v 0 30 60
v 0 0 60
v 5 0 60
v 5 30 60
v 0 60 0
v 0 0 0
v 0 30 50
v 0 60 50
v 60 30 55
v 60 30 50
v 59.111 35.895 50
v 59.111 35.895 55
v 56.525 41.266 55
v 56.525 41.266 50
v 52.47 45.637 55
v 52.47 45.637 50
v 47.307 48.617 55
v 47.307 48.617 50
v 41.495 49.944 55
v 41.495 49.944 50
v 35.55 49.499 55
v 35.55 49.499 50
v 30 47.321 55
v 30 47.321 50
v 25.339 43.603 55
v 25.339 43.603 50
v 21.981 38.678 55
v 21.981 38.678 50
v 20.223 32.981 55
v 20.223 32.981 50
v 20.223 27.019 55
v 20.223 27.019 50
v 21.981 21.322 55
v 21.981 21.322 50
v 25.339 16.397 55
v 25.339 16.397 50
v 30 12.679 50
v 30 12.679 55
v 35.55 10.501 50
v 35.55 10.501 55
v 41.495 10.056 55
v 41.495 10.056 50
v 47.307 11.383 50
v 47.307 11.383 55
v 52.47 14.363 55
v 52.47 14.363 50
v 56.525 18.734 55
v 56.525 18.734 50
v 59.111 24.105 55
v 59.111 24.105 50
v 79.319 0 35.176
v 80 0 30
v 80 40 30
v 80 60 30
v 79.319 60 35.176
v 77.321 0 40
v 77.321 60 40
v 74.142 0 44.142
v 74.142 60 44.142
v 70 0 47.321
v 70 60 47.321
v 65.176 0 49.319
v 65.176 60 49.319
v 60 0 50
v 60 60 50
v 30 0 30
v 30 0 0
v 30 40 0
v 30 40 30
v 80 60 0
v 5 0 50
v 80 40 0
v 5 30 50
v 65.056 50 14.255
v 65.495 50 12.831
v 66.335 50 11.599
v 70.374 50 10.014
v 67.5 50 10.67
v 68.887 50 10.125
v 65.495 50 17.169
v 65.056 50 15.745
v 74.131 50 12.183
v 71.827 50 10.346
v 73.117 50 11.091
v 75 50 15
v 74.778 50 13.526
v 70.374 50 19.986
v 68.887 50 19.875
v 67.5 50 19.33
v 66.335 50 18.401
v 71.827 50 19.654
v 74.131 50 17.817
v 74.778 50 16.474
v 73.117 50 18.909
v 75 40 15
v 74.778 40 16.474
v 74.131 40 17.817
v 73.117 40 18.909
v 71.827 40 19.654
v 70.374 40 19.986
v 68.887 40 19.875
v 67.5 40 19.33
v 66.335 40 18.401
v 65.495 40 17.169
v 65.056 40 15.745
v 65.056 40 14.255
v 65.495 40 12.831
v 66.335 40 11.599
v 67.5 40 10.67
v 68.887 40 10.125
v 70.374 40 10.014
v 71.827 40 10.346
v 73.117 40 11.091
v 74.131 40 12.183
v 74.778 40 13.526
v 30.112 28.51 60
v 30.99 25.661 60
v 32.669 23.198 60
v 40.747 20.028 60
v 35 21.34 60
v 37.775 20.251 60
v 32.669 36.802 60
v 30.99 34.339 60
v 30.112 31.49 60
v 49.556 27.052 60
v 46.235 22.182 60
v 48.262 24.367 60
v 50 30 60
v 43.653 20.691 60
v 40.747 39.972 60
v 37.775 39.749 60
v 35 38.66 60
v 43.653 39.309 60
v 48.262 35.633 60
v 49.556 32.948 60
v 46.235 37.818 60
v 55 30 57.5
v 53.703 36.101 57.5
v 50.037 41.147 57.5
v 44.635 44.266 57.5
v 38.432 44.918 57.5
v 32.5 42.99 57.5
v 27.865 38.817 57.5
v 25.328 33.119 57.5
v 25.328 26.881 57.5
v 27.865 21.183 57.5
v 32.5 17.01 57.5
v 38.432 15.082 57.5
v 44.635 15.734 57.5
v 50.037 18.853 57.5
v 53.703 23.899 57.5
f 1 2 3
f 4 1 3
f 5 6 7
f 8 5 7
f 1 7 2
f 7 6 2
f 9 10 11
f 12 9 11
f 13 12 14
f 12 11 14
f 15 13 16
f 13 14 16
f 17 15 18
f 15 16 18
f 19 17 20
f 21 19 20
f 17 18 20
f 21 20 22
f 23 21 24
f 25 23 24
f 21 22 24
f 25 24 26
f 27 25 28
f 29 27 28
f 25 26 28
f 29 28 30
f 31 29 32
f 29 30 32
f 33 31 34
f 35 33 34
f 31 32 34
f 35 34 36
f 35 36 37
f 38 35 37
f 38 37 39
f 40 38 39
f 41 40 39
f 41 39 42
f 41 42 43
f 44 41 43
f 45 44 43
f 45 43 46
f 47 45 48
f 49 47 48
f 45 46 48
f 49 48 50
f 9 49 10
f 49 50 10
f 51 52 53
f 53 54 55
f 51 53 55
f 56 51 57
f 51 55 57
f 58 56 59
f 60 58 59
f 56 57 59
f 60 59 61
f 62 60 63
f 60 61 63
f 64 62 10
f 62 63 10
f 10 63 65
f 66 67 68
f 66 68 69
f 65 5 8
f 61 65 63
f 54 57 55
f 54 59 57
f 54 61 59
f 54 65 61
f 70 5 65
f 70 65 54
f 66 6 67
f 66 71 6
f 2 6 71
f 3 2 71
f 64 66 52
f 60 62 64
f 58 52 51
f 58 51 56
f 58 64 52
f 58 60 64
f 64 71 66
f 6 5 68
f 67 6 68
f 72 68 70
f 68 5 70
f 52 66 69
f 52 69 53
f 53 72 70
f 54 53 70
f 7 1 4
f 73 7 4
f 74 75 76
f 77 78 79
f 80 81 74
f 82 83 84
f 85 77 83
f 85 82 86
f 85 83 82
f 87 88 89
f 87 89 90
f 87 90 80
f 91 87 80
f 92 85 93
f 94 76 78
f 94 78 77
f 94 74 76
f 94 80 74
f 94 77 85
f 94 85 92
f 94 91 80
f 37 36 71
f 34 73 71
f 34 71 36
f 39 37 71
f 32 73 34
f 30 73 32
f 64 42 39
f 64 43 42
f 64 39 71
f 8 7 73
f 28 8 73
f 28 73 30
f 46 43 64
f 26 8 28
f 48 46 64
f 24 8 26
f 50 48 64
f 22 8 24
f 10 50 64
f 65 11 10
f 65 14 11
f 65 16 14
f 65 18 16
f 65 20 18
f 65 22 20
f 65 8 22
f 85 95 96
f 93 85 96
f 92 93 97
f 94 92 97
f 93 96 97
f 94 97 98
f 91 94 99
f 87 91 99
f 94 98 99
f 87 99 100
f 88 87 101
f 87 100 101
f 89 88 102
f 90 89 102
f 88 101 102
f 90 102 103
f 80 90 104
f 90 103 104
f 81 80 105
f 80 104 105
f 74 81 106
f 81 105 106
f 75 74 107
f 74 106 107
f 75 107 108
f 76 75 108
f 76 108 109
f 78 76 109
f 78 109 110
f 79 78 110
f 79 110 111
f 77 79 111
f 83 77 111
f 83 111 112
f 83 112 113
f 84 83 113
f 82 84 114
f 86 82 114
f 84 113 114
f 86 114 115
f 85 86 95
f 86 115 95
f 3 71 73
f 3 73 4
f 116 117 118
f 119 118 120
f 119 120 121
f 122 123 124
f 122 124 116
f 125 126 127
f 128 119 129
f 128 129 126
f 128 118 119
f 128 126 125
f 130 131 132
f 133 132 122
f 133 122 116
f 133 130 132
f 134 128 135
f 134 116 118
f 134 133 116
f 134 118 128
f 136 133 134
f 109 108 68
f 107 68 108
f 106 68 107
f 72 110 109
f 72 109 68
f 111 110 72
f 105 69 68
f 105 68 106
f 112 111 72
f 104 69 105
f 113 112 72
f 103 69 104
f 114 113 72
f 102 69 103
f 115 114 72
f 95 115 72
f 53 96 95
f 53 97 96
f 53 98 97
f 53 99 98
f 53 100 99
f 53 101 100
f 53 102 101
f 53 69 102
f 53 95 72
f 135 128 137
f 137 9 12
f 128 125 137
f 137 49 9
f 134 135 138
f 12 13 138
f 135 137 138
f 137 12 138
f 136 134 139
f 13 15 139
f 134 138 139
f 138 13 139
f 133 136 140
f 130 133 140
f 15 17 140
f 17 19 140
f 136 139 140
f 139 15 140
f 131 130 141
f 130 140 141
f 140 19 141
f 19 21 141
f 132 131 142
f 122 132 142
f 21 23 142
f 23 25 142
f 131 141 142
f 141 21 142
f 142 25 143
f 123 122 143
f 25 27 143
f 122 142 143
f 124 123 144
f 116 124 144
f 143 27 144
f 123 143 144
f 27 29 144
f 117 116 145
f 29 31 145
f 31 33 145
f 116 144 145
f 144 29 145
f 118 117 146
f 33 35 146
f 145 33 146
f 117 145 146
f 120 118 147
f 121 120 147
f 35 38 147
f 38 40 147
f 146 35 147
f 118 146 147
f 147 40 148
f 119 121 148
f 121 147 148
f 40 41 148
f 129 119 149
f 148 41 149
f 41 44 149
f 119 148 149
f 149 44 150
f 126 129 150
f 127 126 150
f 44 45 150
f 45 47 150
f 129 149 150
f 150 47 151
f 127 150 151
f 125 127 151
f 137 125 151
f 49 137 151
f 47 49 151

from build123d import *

# Parameters (mm, degrees)
F0_W      = 80
F0_H      = 60
F1_DEPTH  = 50
F2_R      = 20
F3_W      = 5
F3_H      = 10
F4_DEPTH  = 30
F6_W      = 50
F6_H      = 30
F7_DEPTH  = 40
F8_R      = 5
F9_DEPTH  = 10
F10_R     = 20
F11_DEPTH = 10
F12_SIZE2 = 5
F12_SIZE  = 10


with BuildPart() as f1:
    # F0 (on Top) → F1 (new body)
    with BuildSketch(Plane.XY):
        with Locations((40, 30)):
            Rectangle(F0_W, F0_H)
    extrude(amount=F1_DEPTH)

    # F2
    f2_edges = [f1.edges().sort_by_distance(p)[0] for p in [
        (80, 30, 50),
    ]]
    fillet(f2_edges, radius=F2_R)


with BuildPart() as f4:
    # F3 (on face) → F4 (new body)
    with BuildSketch(Plane.XZ):
        with Locations((2.5, 55)):
            Rectangle(F3_W, F3_H)
    extrude(amount=-F4_DEPTH)


with BuildPart() as f1_1:
    add(f1.part)

    # F5: union F4
    add(f4.part)

    # F6 (on face) → F7 (cut)
    with BuildSketch(Plane.XZ):
        with Locations((55, 15)):
            Rectangle(F6_W, F6_H)
    extrude(amount=-F7_DEPTH, mode=Mode.SUBTRACT)

    # F8 (on face) → F9 (cut)
    with BuildSketch(Plane.XZ.offset(-40)):
        with Locations((70, 15)):
            Circle(F8_R)
    extrude(amount=-F9_DEPTH, mode=Mode.SUBTRACT)

    # F10 (on face) → F11 (join)
    with BuildSketch(Plane.XY.offset(50)):
        with Locations((40, 30)):
            Circle(F10_R)
    extrude(amount=F11_DEPTH)

    # F12
    f12_edges = [f1_1.edges().sort_by_distance(p)[0] for p in [
        (20, 30, 60),
    ]]
    f12_side = f1_1.faces().sort_by_distance((40, 30, 60))[0]
    chamfer(f12_edges, length=F12_SIZE, length2=F12_SIZE2, reference=f12_side)


solid = f1_1.part
